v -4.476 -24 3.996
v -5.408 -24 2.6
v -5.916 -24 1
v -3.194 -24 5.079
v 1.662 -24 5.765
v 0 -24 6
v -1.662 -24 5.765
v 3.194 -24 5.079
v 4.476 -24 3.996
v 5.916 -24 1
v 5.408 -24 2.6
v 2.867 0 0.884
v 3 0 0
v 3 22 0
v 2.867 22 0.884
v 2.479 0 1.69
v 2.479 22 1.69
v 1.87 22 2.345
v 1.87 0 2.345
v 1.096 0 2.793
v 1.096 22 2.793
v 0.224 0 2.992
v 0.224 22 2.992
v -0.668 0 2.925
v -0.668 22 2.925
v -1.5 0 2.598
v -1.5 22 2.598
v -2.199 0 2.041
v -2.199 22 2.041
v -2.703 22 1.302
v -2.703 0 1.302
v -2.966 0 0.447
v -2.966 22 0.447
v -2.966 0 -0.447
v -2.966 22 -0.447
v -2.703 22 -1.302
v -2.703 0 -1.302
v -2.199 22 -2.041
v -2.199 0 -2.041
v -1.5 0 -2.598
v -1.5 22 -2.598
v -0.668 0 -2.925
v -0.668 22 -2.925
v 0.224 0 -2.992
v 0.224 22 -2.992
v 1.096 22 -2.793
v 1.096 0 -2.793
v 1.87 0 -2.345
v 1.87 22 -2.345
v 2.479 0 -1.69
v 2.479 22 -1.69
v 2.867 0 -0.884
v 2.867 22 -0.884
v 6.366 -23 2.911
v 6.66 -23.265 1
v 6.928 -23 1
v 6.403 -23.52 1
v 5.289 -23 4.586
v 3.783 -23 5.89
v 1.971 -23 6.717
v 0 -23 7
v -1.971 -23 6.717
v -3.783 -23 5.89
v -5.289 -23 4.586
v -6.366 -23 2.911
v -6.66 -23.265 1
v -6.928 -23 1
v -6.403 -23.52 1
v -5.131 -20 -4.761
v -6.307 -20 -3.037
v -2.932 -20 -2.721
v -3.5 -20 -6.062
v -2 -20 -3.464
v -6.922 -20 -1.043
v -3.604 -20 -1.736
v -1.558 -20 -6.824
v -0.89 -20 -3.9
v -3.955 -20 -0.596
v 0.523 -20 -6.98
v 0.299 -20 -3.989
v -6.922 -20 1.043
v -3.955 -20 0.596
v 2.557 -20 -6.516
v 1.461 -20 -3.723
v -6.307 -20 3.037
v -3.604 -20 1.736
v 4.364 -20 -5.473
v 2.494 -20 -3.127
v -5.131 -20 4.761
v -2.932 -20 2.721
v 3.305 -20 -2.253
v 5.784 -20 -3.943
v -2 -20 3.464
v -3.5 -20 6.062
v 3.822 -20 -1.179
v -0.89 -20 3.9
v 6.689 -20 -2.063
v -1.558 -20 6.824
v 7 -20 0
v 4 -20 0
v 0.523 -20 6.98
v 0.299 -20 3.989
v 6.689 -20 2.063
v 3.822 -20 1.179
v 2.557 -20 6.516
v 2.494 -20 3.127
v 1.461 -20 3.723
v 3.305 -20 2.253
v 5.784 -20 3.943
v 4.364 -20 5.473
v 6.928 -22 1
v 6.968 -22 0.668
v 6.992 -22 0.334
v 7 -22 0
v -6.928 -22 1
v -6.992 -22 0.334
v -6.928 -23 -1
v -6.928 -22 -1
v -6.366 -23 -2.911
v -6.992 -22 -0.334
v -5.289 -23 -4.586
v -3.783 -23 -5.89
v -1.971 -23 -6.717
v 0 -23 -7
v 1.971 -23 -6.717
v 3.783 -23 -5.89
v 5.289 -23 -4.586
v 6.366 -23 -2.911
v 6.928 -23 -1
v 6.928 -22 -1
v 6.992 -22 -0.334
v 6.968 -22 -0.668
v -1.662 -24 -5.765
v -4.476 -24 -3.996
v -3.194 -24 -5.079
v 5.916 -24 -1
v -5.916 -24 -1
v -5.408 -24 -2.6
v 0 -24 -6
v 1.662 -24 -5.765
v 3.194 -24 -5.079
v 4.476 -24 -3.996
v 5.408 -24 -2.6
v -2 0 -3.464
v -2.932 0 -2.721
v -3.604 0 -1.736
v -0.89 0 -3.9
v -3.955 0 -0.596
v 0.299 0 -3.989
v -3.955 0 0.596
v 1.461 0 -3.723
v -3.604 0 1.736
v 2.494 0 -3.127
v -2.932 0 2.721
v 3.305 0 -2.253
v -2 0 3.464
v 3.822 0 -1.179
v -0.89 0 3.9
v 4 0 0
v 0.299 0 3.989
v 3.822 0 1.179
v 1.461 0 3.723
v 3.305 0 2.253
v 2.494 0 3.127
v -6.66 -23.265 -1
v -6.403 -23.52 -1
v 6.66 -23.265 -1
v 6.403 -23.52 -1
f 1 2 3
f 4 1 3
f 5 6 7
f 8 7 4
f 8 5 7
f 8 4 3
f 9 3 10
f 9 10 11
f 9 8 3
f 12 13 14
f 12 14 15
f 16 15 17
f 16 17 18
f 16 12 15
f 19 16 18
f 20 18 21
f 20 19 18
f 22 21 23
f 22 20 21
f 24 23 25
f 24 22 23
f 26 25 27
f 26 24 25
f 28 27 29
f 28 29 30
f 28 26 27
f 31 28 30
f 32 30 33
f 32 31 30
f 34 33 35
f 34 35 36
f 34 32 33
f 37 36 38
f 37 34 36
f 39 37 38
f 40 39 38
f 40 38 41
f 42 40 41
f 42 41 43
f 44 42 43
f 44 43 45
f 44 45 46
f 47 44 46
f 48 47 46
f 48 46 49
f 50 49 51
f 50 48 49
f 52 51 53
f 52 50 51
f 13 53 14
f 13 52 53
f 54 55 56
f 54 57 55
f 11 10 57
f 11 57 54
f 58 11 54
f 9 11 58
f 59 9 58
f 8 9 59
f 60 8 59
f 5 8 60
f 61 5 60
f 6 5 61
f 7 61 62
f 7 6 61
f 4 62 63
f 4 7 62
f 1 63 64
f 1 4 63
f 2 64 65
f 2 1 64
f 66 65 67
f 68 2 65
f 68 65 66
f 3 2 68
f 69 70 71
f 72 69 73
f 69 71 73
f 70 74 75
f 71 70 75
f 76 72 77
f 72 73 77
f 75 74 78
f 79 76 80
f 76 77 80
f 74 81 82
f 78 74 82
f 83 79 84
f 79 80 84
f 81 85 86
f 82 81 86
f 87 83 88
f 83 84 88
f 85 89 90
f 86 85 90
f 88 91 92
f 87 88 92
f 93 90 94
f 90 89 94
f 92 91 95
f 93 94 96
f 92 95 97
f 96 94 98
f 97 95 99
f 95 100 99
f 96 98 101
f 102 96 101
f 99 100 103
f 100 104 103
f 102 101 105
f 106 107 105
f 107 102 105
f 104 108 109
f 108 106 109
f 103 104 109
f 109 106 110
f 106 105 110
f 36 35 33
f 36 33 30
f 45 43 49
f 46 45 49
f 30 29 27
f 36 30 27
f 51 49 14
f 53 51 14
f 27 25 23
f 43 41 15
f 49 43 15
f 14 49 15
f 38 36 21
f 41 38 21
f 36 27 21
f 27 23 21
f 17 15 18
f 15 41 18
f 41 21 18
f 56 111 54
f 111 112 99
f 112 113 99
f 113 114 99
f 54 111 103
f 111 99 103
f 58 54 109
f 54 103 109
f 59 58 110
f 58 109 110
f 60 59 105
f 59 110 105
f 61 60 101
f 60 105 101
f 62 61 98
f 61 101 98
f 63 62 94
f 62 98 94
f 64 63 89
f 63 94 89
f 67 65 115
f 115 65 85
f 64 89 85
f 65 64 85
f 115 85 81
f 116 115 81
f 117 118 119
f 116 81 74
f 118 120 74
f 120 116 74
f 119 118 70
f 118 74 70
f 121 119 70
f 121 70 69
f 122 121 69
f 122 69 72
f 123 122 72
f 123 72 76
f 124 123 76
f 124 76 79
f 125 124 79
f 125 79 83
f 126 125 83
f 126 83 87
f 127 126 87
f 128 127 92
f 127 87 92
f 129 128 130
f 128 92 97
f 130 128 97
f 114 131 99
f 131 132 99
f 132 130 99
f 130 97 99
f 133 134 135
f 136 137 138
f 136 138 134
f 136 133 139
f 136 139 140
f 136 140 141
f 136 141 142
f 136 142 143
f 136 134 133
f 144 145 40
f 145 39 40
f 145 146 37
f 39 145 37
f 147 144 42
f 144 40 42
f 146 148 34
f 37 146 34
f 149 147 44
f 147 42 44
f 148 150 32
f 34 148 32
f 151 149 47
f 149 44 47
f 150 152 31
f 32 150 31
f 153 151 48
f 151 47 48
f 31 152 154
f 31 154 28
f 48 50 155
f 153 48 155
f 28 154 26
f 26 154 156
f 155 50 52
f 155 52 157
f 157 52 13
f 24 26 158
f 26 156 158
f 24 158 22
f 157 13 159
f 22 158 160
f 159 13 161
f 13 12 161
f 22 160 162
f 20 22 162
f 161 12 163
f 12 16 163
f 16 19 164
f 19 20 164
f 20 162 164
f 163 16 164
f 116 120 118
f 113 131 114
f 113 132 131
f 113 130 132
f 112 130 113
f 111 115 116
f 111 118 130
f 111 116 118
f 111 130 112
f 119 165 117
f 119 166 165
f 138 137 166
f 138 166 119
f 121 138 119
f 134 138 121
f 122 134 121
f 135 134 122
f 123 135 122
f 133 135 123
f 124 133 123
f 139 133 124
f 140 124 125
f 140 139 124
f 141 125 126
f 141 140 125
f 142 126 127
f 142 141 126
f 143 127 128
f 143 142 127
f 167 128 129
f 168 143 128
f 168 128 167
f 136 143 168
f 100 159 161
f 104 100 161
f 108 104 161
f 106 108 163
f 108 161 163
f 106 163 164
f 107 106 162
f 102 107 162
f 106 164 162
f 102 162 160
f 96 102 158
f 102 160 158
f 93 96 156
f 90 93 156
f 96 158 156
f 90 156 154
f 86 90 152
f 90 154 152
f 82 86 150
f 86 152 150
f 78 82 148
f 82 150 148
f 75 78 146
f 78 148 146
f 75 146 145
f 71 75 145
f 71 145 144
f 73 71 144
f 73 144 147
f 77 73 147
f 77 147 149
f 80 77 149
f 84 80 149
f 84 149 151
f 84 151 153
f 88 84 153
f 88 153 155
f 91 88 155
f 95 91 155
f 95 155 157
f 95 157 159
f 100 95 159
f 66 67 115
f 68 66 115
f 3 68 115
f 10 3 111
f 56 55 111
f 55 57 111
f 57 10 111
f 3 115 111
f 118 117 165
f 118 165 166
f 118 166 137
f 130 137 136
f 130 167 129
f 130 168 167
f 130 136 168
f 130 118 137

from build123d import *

# Parameters (mm, degrees)
F0_R          = 3
F1_DEPTH      = 22
F1_DEPTH_BACK = 24
F0_R_2        = 4
F2_DEPTH      = 24
F3_START      = 20
F0_R_3        = 7
F3_DEPTH      = 4
F5_START      = 22
F4_W          = 30
F4_H          = 2
F5_DEPTH      = 3
F6_SIZE       = 1


with BuildPart() as f1:
    # F0 (on Front) → F1 (new body, two sides)
    with BuildSketch(Plane.XZ) as f1_sk:
        Circle(F0_R)
    extrude(amount=-F1_DEPTH)
    extrude(f1_sk.sketch, amount=F1_DEPTH_BACK)

    # F0 (on Front) → F2 (join)
    with BuildSketch(Plane.XZ):
        Circle(F0_R_2)
        Circle(F0_R, mode=Mode.SUBTRACT)
    extrude(amount=F2_DEPTH)

    # F0 (on Front) → F3 (join)
    with BuildSketch(Plane.XZ.offset(F3_START)):
        Circle(F0_R_3)
        Circle(F0_R_2, mode=Mode.SUBTRACT)
    extrude(amount=F3_DEPTH)

    # F4 (on Front) → F5 (cut)
    with BuildSketch(Plane.XZ.offset(F5_START)):
        Rectangle(F4_W, F4_H)
    extrude(amount=F5_DEPTH, mode=Mode.SUBTRACT)

    # F6
    f6_edges = [f1.edges().sort_by_distance(p)[0] for p in [
        (0, -24, 7),
        (0, -24, -7),
    ]]
    chamfer(f6_edges, length=F6_SIZE)


solid = f1.part
